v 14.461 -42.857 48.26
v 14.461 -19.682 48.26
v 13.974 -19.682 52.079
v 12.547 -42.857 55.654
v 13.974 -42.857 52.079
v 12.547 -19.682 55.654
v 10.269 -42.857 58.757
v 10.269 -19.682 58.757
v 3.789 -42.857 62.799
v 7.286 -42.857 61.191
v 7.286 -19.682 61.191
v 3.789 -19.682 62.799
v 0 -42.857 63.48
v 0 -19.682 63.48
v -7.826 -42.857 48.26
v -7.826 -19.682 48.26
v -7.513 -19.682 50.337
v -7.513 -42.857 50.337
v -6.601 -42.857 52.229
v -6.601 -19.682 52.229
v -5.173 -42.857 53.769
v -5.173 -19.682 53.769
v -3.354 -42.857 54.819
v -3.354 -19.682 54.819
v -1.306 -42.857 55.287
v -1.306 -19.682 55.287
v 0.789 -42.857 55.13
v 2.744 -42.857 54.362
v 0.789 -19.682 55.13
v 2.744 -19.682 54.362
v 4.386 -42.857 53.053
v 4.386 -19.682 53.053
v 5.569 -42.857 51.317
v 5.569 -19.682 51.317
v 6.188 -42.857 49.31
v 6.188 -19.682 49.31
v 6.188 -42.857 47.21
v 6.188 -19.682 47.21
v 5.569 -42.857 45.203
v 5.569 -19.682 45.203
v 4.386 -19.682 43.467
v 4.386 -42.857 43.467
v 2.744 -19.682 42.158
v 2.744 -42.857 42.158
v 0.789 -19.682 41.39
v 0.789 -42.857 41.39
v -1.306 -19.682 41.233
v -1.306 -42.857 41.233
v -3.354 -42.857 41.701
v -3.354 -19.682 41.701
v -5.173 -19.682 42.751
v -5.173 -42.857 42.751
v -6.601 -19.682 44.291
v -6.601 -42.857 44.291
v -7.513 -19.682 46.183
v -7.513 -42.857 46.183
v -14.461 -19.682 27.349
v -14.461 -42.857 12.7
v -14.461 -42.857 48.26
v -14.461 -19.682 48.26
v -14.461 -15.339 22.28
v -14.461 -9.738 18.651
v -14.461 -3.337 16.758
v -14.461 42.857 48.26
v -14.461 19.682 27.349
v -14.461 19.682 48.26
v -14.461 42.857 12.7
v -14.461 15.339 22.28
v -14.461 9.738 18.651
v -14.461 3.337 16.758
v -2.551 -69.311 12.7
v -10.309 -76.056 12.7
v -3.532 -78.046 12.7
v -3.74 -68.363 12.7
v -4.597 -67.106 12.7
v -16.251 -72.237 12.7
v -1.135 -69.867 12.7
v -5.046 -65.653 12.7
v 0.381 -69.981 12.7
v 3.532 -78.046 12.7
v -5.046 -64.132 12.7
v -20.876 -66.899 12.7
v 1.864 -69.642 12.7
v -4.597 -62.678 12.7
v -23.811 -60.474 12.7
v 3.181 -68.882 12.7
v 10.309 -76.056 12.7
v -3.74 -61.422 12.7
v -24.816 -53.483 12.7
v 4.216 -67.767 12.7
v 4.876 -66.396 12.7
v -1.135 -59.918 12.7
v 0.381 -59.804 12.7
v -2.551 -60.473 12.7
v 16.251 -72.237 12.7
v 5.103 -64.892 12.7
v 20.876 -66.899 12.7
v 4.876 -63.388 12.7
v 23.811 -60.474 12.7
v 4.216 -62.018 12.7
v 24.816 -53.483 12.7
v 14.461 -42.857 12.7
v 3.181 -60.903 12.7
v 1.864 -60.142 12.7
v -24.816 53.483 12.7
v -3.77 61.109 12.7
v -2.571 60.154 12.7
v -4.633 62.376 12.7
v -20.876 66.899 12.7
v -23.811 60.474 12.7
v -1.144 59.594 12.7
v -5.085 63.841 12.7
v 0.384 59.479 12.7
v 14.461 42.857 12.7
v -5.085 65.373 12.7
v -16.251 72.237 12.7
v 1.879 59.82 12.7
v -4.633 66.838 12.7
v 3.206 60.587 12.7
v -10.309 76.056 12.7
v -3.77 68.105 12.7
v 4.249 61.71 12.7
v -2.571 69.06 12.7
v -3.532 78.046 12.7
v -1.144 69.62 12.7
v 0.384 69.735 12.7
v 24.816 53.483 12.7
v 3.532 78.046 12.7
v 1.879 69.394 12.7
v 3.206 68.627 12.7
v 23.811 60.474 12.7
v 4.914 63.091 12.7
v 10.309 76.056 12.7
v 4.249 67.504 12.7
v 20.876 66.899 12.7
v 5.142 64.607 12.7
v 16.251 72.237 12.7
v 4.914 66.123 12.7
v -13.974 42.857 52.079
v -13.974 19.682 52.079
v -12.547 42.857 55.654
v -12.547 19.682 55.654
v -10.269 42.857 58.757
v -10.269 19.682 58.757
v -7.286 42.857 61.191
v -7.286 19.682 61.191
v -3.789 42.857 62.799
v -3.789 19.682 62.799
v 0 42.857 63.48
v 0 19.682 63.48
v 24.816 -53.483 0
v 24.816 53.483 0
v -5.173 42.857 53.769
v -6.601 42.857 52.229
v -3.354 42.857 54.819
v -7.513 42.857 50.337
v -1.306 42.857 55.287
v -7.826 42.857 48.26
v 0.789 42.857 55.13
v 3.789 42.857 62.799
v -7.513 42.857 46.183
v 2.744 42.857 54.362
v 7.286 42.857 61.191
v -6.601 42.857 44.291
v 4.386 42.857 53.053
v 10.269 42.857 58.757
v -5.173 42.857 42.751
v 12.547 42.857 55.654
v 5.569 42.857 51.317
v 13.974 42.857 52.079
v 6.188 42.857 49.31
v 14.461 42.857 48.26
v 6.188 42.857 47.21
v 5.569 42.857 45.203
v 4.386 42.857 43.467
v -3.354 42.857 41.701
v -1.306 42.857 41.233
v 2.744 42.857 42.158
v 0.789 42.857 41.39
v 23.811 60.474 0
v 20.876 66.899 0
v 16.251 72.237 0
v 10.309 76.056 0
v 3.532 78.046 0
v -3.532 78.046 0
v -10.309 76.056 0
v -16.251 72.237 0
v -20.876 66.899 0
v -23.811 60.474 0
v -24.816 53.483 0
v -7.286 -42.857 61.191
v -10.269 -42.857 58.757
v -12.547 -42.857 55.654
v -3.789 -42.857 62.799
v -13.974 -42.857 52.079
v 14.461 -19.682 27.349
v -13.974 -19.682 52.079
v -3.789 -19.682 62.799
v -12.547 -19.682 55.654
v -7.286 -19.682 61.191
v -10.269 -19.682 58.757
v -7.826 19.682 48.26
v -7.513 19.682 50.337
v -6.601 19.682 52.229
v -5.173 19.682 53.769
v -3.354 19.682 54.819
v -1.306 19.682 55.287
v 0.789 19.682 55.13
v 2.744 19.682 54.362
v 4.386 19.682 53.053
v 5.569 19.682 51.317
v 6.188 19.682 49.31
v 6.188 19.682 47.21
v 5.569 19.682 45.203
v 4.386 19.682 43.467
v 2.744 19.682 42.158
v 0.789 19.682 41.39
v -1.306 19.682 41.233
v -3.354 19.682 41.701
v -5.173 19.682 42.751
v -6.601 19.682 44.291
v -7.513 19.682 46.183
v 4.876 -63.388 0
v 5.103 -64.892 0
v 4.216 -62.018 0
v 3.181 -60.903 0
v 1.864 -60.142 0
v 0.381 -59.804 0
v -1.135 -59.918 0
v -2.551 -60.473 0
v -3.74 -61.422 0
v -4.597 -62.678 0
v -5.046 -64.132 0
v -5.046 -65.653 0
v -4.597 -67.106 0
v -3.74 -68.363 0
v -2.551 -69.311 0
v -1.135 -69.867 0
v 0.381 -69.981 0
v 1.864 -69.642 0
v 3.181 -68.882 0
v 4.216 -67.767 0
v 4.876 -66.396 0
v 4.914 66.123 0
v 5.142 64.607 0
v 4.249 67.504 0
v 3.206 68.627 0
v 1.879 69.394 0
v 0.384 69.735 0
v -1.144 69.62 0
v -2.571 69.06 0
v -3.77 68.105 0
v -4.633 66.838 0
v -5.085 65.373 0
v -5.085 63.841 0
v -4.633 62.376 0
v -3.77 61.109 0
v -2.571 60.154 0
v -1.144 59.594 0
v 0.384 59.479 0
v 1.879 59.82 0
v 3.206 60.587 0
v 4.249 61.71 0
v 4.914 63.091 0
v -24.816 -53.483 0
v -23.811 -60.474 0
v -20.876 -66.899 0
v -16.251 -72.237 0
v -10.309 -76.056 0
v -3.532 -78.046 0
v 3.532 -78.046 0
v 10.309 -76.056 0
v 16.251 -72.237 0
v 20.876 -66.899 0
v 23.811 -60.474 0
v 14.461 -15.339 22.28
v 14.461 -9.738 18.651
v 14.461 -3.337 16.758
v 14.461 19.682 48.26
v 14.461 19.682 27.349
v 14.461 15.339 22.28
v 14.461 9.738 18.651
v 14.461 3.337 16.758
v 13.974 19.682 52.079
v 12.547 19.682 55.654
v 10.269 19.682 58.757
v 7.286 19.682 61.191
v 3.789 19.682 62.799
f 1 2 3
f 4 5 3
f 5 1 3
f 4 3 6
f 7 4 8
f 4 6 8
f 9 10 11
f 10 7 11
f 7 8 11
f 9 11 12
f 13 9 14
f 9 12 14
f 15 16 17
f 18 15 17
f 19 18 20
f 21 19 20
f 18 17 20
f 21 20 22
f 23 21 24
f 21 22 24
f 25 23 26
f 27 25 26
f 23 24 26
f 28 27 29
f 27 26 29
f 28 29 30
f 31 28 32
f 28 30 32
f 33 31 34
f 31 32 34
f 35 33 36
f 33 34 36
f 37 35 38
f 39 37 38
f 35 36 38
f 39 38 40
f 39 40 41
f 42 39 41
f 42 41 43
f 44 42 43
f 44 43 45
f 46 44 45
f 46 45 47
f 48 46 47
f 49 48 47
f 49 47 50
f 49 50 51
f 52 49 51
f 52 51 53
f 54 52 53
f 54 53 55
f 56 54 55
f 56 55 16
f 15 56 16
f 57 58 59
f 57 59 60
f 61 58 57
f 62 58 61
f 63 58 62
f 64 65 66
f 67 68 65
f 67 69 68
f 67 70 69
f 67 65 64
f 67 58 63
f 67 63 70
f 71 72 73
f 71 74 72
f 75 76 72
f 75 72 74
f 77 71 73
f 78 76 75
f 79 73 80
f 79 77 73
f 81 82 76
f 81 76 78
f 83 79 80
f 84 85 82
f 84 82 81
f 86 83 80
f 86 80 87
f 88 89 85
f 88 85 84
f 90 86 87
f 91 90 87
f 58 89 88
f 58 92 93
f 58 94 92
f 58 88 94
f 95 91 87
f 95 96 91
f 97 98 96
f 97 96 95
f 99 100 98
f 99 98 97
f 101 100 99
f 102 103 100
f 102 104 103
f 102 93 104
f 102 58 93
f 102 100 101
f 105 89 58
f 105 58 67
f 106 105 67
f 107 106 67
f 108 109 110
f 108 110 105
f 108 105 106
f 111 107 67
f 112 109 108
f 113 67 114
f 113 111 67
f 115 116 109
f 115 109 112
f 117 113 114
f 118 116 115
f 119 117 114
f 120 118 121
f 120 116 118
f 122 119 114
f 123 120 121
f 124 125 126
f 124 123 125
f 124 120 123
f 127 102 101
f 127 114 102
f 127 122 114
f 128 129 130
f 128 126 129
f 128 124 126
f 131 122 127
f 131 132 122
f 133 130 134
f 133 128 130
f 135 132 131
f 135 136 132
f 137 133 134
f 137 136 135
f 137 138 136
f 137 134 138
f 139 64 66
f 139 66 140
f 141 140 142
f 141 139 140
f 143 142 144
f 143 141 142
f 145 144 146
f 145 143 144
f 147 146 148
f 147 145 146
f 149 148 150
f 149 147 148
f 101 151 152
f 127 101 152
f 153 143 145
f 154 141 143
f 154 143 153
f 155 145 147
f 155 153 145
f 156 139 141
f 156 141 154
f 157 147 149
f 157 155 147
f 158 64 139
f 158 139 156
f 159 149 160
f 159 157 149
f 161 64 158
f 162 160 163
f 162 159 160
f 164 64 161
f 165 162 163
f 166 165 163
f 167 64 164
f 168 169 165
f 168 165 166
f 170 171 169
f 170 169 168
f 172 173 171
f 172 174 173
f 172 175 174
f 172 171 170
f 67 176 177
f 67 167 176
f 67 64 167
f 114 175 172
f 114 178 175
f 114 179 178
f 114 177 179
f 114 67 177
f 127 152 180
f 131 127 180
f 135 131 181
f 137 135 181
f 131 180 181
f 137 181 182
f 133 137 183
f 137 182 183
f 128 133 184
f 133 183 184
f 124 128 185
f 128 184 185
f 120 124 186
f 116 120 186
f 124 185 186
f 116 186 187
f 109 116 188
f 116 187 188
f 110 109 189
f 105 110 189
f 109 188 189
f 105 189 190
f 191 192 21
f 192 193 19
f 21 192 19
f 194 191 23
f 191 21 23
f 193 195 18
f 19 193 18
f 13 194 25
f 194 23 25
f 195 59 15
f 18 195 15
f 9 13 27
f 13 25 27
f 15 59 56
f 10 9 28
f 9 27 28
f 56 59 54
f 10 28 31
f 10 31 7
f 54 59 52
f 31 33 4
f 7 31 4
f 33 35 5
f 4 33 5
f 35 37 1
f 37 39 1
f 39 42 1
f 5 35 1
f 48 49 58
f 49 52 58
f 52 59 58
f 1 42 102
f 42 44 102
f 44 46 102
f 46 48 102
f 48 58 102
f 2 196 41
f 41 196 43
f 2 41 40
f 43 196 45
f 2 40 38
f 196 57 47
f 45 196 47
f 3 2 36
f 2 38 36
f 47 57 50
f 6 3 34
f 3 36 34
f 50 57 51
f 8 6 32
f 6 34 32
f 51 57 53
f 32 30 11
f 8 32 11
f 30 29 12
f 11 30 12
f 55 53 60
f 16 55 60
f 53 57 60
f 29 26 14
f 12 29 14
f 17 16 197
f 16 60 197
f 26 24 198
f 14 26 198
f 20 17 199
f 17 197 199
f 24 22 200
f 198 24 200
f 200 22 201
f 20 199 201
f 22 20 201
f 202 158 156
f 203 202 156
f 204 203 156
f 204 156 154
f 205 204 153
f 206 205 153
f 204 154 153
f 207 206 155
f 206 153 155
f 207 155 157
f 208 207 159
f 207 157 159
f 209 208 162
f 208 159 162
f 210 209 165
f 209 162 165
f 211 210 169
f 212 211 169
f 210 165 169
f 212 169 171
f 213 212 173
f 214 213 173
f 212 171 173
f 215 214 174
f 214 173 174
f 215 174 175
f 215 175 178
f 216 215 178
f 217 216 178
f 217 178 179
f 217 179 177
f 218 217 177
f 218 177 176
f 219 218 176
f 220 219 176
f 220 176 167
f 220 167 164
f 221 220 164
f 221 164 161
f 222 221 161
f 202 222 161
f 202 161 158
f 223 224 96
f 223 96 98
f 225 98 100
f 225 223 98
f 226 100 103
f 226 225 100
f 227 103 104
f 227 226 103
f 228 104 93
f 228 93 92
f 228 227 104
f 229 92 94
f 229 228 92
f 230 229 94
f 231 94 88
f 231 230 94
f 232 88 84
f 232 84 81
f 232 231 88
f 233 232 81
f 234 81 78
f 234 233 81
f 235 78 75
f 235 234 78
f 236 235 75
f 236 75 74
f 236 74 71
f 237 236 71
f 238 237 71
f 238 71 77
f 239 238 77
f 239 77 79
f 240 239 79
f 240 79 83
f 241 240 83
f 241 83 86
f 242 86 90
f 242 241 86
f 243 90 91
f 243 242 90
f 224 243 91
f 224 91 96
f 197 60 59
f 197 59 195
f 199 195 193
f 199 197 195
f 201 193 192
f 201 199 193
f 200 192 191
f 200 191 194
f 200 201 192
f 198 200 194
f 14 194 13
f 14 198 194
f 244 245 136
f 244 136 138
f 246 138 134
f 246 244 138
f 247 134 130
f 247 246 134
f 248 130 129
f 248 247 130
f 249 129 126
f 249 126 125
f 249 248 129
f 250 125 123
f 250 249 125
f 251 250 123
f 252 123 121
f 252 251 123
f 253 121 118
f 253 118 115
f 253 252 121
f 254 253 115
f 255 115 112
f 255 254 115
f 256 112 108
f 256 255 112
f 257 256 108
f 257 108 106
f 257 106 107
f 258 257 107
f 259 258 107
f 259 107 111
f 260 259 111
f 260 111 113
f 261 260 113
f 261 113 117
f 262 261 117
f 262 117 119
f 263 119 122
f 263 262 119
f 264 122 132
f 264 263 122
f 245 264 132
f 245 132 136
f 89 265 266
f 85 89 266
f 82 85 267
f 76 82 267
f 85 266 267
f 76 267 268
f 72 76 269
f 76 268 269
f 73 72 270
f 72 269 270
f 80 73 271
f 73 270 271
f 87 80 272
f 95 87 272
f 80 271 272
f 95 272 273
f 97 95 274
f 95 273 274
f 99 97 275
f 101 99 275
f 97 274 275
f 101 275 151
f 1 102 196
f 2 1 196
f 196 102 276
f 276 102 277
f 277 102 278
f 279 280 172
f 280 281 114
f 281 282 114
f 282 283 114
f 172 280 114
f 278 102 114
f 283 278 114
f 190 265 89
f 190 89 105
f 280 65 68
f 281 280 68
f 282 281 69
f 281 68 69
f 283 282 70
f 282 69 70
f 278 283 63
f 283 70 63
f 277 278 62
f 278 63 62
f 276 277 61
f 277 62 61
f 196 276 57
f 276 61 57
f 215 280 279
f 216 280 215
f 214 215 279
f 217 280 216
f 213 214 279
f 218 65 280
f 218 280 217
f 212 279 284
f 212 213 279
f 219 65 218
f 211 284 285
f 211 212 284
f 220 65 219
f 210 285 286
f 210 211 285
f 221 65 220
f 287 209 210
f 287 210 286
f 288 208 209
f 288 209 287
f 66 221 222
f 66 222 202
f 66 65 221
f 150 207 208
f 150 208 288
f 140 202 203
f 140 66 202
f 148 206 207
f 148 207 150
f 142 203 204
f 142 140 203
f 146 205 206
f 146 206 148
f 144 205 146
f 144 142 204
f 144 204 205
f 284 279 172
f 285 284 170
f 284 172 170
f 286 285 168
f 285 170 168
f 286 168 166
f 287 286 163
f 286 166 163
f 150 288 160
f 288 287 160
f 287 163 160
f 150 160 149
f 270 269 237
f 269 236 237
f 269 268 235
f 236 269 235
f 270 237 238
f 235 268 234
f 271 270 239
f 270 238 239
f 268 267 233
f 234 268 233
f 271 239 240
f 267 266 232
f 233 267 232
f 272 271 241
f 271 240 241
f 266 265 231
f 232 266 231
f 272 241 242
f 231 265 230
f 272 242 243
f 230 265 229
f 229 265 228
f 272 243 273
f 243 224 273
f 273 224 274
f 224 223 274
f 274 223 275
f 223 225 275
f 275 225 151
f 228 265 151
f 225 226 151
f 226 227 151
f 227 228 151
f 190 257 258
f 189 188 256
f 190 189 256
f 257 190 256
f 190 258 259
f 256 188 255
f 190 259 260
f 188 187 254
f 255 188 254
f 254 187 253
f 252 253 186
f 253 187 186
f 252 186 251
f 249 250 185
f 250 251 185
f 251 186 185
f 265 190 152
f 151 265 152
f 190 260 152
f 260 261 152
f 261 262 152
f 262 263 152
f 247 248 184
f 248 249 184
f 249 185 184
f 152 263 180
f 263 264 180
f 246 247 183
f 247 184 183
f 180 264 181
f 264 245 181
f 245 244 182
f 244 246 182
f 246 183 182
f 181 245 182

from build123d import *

# Parameters (mm, degrees)
F0_R          = 5.1422573348
F0_W          = 49.6318712831
F0_H          = 106.9652438164
F0_R_2        = 5.1025471004
F1_DEPTH      = 12.7
F2_W          = 28.9213098586
F2_H          = 85.7132077217
F3_DEPTH      = 50.8
F4_T1_DEPTH   = 161.9132077217
F5_R          = 7.0462908342
F6_DEPTH      = 101.6
F7_W          = 39.3632203341
F7_H          = 41.8217248726
F8_DEPTH      = 50.8
F8_DEPTH_BACK = 25.4


# Not quite as in the source:
# - a fillet or chamfer that OpenCascade refuses, or shapes differently, is made with other operations: its cross-section is extruded or revolved along the edge and cut away or added


with BuildPart() as f1:
    # F0 (on Top) → F1 (new body)
    with BuildSketch(Plane.XY):
        with BuildLine():
            ThreePointArc((24.8159356415, 53.4826219082), (0, 78.2985575497), (-24.8159356415, 53.4826219082))
            Line((-24.8159356415, 53.4826219082), (24.8159356415, 53.4826219082))
        make_face()
        with Locations((0, 64.6070018411)):
            Circle(F0_R, mode=Mode.SUBTRACT)
        Rectangle(F0_W, F0_H)
        with BuildLine():
            Line((24.8159356415, -53.4826219082), (-24.8159356415, -53.4826219082))
            ThreePointArc((-24.8159356415, -53.4826219082), (0, -78.2985575497), (24.8159356415, -53.4826219082))
        make_face()
        with Locations((0, -64.8922473192)):
            Circle(F0_R_2, mode=Mode.SUBTRACT)
    extrude(amount=F1_DEPTH)

    # F2 (on face) → F3 (join)
    with BuildSketch(Plane.XY.offset(12.7)):
        Rectangle(F2_W, F2_H)
    extrude(amount=F3_DEPTH)

    # F4: fillet of radius 15.24 on 2 edges, made by hand

    # F4_s2 → F4_t1 (cut)
    with BuildSketch(Plane.XZ.offset(-80.9566038609)):
        with BuildLine():
            ThreePointArc((14.4606549293, 48.26), (9.9969622746, 59.0363073453), (-0.7793450707, 63.5))
            Line((-0.7793450707, 63.5), (14.4606549293, 63.5))
            Line((14.4606549293, 63.5), (14.4606549293, 48.26))
        make_face()
        with BuildLine():
            ThreePointArc((-14.4606549293, 48.26), (-9.9969622746, 59.0363073453), (0.7793450707, 63.5))
            Line((0.7793450707, 63.5), (-14.4606549293, 63.5))
            Line((-14.4606549293, 63.5), (-14.4606549293, 48.26))
        make_face()
    extrude(amount=F4_T1_DEPTH, mode=Mode.SUBTRACT)

    # F5 (on face) → F6 (cut)
    with BuildSketch(Plane(origin=(0, 42.8566038609, 0), x_dir=(-1, 0, 0), z_dir=(0, 1, 0))):
        with Locations((0.7793450707, 48.26)):
            Circle(F5_R)
    extrude(amount=-F6_DEPTH, mode=Mode.SUBTRACT)

    # F7 (on face) → F8 (cut, two sides)
    with BuildSketch(Plane(origin=(-14.4606549293, 0, 0), x_dir=(0, -1, 0), z_dir=(-1, 0, 0))) as f8_sk:
        with Locations((0, 48.26)):
            Rectangle(F7_W, F7_H)
        with BuildLine():
            Line((19.681610167, 27.3491375637), (-19.681610167, 27.3491375637))
            ThreePointArc((-19.681610167, 27.3491375637), (0, 16.517771495), (19.681610167, 27.3491375637))
        make_face()
    extrude(amount=-F8_DEPTH, mode=Mode.SUBTRACT)
    extrude(f8_sk.sketch, amount=F8_DEPTH_BACK, mode=Mode.SUBTRACT)


solid = f1.part
